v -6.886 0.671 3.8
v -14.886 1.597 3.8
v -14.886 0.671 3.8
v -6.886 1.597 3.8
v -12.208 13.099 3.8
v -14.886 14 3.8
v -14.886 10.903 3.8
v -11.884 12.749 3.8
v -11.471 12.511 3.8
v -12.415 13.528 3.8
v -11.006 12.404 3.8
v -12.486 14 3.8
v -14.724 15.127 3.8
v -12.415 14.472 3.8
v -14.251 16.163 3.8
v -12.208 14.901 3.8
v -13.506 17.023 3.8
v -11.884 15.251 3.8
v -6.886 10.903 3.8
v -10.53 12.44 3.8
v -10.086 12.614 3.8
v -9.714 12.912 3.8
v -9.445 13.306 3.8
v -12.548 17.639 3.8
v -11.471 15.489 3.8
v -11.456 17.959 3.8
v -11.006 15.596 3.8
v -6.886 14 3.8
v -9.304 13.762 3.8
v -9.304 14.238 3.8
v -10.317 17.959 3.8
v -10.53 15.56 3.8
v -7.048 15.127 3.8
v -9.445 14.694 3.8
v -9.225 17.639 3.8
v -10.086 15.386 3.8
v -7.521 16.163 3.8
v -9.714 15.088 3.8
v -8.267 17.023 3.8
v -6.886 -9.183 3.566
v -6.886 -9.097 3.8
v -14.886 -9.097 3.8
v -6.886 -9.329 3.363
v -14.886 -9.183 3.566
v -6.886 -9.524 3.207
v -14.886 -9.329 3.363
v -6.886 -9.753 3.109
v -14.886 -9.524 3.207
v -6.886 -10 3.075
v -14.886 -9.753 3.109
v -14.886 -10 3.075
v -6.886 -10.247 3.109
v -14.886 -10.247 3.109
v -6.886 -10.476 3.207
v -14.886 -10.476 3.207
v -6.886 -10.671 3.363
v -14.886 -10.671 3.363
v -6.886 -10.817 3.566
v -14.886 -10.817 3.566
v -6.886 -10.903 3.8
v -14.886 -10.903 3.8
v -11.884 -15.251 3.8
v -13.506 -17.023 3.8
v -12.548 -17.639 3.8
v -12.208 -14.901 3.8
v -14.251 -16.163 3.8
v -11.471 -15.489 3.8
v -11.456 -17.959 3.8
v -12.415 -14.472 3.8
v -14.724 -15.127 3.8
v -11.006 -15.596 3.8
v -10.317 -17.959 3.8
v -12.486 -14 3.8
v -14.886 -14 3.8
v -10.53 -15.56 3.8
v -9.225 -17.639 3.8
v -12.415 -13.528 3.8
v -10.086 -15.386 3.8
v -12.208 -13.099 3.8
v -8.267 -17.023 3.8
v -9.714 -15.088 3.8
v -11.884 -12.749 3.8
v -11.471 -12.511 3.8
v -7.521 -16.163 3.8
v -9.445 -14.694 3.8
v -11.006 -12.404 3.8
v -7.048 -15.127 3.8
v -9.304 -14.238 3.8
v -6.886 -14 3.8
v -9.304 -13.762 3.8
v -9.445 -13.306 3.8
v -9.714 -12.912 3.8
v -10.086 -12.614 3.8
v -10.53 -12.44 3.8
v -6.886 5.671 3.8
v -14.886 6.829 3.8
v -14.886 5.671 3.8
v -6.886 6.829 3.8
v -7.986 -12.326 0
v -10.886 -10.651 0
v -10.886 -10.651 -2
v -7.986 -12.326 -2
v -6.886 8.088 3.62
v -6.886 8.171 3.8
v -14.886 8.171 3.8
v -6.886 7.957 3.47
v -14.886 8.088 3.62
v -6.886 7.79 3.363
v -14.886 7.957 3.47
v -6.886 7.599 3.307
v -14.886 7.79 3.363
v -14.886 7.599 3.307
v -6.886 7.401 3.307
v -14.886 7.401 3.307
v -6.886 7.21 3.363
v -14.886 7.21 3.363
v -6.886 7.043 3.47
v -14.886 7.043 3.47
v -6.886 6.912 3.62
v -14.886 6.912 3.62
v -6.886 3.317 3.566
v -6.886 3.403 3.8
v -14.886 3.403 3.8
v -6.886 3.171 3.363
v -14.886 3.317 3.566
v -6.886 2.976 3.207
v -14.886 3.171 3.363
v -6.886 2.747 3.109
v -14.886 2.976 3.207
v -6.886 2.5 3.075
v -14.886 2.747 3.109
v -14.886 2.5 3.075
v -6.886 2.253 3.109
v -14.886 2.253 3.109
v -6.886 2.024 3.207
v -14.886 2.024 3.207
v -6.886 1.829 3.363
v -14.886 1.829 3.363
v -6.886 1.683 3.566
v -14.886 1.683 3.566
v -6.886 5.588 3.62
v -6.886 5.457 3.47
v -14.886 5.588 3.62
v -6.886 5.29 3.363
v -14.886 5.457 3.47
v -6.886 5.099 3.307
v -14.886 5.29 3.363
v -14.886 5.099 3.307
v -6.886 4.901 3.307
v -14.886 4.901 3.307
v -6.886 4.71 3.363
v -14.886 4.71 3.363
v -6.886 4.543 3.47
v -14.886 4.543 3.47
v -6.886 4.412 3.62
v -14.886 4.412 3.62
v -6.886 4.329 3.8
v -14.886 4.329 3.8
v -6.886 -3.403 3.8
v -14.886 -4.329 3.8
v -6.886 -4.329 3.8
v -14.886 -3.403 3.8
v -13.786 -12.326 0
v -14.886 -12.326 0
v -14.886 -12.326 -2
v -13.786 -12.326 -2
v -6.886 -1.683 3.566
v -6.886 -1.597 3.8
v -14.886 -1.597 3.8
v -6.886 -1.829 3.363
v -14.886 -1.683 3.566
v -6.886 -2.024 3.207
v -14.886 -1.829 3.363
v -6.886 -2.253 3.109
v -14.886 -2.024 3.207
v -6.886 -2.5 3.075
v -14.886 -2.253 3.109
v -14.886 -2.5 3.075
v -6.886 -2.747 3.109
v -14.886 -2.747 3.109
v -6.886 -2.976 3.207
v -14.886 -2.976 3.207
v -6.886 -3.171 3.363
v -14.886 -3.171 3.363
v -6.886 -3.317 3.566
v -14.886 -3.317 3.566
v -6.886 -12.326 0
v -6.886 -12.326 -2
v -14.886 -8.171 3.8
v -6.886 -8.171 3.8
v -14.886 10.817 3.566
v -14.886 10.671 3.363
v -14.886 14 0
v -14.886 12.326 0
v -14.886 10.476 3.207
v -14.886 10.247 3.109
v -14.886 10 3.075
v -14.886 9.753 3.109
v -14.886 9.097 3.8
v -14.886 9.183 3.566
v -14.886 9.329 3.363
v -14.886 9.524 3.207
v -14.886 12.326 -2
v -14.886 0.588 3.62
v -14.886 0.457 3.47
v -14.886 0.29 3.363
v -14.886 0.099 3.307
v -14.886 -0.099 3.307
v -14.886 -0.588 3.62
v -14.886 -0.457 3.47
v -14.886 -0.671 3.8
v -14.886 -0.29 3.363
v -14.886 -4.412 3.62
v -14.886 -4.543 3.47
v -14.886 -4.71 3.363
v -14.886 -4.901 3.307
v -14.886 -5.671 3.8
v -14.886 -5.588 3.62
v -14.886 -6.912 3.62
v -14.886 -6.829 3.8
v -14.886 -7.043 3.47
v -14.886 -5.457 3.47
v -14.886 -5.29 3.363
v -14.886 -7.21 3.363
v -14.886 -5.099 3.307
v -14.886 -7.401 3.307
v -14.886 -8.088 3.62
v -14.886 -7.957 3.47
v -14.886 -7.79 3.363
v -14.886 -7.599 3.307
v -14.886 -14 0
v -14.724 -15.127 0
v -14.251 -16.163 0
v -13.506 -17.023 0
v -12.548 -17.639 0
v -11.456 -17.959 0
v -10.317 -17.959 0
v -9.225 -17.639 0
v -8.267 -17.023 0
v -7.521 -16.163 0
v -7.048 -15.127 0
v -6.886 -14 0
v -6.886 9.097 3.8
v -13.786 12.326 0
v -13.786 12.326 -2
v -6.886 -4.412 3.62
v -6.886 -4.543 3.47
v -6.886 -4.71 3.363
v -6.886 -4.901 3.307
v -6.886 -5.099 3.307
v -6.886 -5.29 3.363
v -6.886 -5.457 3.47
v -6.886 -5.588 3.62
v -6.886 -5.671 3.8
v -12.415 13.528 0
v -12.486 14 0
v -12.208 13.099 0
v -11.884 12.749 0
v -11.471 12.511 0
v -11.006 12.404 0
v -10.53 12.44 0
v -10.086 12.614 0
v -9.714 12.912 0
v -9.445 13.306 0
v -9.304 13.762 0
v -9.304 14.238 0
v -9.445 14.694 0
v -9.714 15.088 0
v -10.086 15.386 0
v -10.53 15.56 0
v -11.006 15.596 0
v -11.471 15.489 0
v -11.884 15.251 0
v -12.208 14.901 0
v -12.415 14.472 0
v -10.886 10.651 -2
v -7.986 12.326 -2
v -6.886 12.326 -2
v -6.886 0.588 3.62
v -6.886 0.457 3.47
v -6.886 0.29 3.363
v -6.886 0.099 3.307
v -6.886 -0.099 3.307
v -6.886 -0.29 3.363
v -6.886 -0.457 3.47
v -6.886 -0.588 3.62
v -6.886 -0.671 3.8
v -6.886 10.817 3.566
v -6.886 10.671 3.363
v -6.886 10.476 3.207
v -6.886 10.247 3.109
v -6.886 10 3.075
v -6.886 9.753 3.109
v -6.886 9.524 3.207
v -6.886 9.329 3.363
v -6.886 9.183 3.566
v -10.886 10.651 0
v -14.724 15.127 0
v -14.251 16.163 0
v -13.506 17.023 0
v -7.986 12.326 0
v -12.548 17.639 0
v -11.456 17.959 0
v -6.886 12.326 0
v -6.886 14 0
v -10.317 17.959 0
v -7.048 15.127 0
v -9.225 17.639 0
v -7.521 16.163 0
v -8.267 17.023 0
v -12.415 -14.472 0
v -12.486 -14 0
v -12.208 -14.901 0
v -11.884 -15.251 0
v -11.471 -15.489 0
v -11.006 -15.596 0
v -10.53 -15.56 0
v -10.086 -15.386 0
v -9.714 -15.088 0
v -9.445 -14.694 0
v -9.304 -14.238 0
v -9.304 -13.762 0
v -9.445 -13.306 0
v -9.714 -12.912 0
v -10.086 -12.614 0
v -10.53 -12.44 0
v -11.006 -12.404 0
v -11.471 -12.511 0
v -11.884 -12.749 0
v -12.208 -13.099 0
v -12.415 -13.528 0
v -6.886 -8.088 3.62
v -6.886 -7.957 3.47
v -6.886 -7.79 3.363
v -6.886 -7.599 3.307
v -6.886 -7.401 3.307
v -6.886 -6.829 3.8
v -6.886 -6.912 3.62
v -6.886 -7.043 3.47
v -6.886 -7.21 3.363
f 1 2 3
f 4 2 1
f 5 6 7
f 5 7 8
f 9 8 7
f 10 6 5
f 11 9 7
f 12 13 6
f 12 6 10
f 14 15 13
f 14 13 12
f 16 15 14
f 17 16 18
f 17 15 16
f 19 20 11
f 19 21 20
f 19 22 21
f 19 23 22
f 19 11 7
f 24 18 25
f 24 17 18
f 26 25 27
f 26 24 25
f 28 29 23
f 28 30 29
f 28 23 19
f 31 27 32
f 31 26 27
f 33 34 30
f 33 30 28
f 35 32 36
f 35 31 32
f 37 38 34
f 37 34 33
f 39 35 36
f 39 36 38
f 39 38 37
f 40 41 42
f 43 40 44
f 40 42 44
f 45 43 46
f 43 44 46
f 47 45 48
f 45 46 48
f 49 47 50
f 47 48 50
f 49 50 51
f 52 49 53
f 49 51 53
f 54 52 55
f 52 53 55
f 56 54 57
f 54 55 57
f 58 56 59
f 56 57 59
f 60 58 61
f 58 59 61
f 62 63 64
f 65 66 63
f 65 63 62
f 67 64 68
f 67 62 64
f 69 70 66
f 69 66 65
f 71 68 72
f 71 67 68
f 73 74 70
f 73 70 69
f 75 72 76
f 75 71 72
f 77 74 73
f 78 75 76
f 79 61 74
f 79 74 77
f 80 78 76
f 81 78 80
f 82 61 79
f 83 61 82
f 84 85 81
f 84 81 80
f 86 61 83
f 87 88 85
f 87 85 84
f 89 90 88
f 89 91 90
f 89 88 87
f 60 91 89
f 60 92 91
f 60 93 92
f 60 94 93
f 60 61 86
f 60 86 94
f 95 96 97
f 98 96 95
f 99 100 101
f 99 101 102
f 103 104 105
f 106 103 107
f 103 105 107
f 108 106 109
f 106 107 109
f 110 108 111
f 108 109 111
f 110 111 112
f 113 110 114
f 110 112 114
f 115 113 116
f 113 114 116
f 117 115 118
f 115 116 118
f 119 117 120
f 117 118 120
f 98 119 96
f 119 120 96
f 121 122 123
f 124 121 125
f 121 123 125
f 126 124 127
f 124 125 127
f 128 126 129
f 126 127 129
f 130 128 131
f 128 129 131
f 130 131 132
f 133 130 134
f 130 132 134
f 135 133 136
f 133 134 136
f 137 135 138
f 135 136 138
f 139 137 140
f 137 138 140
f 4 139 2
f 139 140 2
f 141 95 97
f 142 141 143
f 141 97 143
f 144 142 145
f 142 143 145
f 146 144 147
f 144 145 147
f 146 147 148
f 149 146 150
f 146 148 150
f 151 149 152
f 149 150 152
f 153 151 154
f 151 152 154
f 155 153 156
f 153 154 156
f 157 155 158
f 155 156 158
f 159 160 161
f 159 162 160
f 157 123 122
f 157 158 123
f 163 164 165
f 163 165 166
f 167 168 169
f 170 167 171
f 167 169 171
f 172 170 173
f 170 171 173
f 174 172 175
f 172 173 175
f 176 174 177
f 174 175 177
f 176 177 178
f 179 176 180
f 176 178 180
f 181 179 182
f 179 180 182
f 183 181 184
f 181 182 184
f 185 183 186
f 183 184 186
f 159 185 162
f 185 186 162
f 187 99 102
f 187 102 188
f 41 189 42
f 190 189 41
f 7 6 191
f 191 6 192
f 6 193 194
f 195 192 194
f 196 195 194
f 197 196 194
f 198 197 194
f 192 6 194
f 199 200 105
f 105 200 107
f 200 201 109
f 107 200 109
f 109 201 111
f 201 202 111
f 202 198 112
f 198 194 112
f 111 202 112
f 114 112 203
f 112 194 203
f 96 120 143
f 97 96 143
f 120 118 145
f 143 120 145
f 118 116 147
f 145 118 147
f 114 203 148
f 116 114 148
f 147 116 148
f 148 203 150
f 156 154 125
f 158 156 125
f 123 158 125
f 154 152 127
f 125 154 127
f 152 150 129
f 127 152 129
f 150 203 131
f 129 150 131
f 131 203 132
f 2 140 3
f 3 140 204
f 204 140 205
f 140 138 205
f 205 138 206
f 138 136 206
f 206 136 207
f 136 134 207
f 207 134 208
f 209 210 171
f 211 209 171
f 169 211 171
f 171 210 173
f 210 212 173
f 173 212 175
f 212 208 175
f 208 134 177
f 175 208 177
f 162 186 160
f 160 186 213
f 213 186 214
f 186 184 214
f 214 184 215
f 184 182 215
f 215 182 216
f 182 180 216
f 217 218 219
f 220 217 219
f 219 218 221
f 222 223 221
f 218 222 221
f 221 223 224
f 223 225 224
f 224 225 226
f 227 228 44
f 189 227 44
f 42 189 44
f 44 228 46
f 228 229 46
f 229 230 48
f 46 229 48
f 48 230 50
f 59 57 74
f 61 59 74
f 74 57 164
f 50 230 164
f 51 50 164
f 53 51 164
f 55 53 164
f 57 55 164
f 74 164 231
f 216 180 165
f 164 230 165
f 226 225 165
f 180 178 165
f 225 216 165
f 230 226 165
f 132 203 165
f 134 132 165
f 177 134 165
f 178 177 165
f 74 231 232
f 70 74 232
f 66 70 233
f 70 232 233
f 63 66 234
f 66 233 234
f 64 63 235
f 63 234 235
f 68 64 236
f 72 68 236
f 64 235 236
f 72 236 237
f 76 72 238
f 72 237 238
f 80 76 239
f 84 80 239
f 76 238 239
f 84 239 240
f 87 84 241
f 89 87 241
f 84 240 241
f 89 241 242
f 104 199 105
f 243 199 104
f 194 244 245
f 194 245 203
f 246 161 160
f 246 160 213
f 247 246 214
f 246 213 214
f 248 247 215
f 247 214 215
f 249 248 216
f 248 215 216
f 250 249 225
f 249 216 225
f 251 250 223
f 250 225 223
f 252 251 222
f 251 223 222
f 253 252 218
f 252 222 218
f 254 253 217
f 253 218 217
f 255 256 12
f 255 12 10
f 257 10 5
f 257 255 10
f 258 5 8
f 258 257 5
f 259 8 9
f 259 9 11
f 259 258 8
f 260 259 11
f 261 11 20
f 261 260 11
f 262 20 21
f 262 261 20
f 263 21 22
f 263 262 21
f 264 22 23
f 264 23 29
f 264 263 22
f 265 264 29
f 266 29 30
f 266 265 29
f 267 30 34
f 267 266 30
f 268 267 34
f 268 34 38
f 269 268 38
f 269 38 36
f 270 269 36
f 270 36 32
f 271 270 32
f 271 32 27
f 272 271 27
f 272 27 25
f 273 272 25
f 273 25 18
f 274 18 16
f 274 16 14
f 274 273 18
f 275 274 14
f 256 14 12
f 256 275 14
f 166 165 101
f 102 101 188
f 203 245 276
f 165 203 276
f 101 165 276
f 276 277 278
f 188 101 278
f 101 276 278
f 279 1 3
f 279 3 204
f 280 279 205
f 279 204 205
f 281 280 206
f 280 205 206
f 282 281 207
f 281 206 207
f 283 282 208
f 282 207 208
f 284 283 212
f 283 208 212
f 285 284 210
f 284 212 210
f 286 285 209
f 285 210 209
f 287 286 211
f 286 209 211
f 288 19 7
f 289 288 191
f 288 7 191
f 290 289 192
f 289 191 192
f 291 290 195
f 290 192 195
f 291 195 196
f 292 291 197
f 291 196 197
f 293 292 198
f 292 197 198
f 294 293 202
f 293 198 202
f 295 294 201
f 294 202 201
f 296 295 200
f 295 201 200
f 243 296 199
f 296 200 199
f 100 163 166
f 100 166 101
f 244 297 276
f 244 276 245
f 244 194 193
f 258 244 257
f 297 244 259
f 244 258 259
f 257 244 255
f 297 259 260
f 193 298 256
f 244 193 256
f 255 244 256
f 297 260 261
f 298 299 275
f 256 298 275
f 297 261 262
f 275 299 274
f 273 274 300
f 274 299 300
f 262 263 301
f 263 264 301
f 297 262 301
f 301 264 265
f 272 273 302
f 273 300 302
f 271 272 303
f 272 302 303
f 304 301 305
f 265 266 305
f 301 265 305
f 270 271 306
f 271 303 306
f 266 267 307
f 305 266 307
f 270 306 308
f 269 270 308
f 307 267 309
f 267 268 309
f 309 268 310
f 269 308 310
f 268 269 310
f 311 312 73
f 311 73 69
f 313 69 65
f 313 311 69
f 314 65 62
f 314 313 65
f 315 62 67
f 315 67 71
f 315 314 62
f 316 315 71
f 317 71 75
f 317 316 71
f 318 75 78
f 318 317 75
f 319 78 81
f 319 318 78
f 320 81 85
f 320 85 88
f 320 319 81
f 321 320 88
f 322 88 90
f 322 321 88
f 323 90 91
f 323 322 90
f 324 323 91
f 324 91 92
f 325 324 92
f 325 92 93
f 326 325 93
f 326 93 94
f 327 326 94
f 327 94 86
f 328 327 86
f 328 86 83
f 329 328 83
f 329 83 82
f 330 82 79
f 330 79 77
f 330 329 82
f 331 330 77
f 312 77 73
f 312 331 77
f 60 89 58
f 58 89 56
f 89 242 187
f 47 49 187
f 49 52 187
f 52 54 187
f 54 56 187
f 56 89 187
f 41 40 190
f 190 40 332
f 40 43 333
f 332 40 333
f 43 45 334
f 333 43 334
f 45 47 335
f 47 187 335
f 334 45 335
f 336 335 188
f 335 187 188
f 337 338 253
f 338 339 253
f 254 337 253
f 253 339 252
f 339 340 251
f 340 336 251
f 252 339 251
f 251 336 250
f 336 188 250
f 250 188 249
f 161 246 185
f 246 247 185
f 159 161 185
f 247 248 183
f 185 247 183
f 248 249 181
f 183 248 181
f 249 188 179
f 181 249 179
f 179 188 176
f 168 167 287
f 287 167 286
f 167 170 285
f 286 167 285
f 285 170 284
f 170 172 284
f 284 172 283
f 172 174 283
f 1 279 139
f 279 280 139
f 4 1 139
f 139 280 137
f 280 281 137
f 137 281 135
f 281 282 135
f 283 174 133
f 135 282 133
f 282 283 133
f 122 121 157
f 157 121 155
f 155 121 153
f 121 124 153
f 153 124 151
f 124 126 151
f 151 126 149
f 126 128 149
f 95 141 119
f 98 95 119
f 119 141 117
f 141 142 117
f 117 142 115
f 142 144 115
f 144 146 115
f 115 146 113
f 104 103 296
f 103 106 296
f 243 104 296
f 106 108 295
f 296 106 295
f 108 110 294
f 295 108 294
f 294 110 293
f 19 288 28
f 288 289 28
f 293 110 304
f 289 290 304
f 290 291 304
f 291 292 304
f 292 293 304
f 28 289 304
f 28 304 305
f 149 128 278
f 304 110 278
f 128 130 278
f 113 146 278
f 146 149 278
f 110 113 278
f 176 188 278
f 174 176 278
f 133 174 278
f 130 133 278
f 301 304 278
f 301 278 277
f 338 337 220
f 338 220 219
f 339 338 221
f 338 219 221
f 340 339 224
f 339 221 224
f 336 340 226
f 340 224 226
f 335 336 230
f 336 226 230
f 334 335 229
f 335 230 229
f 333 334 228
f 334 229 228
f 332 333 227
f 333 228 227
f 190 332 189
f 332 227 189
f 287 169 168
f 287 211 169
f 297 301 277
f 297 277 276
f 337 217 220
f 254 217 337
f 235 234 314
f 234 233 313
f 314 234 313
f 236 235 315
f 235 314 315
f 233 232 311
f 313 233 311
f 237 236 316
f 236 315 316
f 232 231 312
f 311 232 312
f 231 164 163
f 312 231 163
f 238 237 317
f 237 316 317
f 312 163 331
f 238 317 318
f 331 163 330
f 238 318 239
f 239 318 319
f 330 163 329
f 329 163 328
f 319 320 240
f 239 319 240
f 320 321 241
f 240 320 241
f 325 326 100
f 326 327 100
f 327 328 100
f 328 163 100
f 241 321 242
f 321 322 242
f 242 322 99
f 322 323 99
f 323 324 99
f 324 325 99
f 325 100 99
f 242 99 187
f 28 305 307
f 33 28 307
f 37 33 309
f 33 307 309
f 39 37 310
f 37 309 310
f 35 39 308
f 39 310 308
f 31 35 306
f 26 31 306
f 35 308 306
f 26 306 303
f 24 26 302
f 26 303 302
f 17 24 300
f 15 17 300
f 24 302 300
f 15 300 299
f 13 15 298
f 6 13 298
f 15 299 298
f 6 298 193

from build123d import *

# Parameters (mm, degrees)
SKETCH_2_R          = 1.6
EXTRUDE_1_DEPTH     = 3.8
CUT_EXTRUDE_1_REACH = 22.061
SKETCH_3_R          = 0.925
SKETCH_3_R_2        = 0.7
EXTRUDE_2_DEPTH     = 2


with BuildPart() as part:
    # Эскиз2 → Бобышка-Вытянуть1 (new body)
    with BuildSketch(Plane.XY):
        with BuildLine():
            Line((-14.886464029, 14), (-14.886464029, -14))
            ThreePointArc((-14.886464029, -14), (-10.886464029, -18), (-6.886464029, -14))
            Line((-6.886464029, -14), (-6.886464029, 14))
            ThreePointArc((-6.886464029, 14), (-10.886464029, 18), (-14.886464029, 14))
        make_face()
        with Locations(Location((-10.886464029, -14, 0), (0, 0, 180))):
            Circle(SKETCH_2_R, mode=Mode.SUBTRACT)
        with Locations(Location((-10.886464029, 14, 0), (0, 0, 180))):
            Circle(SKETCH_2_R, mode=Mode.SUBTRACT)
    extrude(amount=EXTRUDE_1_DEPTH)

    # Эскиз3 → Вырез-Вытянуть1 (cut, up to next)
    with BuildSketch(Plane.ZY.offset(14.886464029), mode=Mode.PRIVATE) as cut_extrude_1_sk1:
        with Locations((4, -10)):
            Circle(SKETCH_3_R)
    cut_extrude_1_tool1 = extrude(cut_extrude_1_sk1.sketch, amount=-CUT_EXTRUDE_1_REACH, mode=Mode.PRIVATE) & part.part
    # Эскиз3 → Вырез-Вытянуть1 (cut, up to next)
    with BuildSketch(Plane.ZY.offset(14.886464029), mode=Mode.PRIVATE) as cut_extrude_1_sk2:
        with Locations((4, -7.5)):
            Circle(SKETCH_3_R_2)
    cut_extrude_1_tool2 = extrude(cut_extrude_1_sk2.sketch, amount=-CUT_EXTRUDE_1_REACH, mode=Mode.PRIVATE) & part.part
    # Эскиз3 → Вырез-Вытянуть1 (cut, up to next)
    with BuildSketch(Plane.ZY.offset(14.886464029), mode=Mode.PRIVATE) as cut_extrude_1_sk3:
        with Locations((4, -5)):
            Circle(SKETCH_3_R_2)
    cut_extrude_1_tool3 = extrude(cut_extrude_1_sk3.sketch, amount=-CUT_EXTRUDE_1_REACH, mode=Mode.PRIVATE) & part.part
    # Эскиз3 → Вырез-Вытянуть1 (cut, up to next)
    with BuildSketch(Plane.ZY.offset(14.886464029), mode=Mode.PRIVATE) as cut_extrude_1_sk4:
        with Locations((4, 10)):
            Circle(SKETCH_3_R)
    cut_extrude_1_tool4 = extrude(cut_extrude_1_sk4.sketch, amount=-CUT_EXTRUDE_1_REACH, mode=Mode.PRIVATE) & part.part
    # Эскиз3 → Вырез-Вытянуть1 (cut, up to next)
    with BuildSketch(Plane.ZY.offset(14.886464029), mode=Mode.PRIVATE) as cut_extrude_1_sk5:
        with Locations((4, 7.5)):
            Circle(SKETCH_3_R_2)
    cut_extrude_1_tool5 = extrude(cut_extrude_1_sk5.sketch, amount=-CUT_EXTRUDE_1_REACH, mode=Mode.PRIVATE) & part.part
    # Эскиз3 → Вырез-Вытянуть1 (cut, up to next)
    with BuildSketch(Plane.ZY.offset(14.886464029), mode=Mode.PRIVATE) as cut_extrude_1_sk6:
        with Locations((4, 5)):
            Circle(SKETCH_3_R_2)
    cut_extrude_1_tool6 = extrude(cut_extrude_1_sk6.sketch, amount=-CUT_EXTRUDE_1_REACH, mode=Mode.PRIVATE) & part.part
    # Эскиз3 → Вырез-Вытянуть1 (cut, up to next)
    with BuildSketch(Plane.ZY.offset(14.886464029), mode=Mode.PRIVATE) as cut_extrude_1_sk7:
        with Locations((4, 2.5)):
            Circle(SKETCH_3_R)
    cut_extrude_1_tool7 = extrude(cut_extrude_1_sk7.sketch, amount=-CUT_EXTRUDE_1_REACH, mode=Mode.PRIVATE) & part.part
    # Эскиз3 → Вырез-Вытянуть1 (cut, up to next)
    with BuildSketch(Plane.ZY.offset(14.886464029), mode=Mode.PRIVATE) as cut_extrude_1_sk8:
        with Locations((4, 0)):
            Circle(SKETCH_3_R_2)
    cut_extrude_1_tool8 = extrude(cut_extrude_1_sk8.sketch, amount=-CUT_EXTRUDE_1_REACH, mode=Mode.PRIVATE) & part.part
    # Эскиз3 → Вырез-Вытянуть1 (cut, up to next)
    with BuildSketch(Plane.ZY.offset(14.886464029), mode=Mode.PRIVATE) as cut_extrude_1_sk9:
        with Locations((4, -2.5)):
            Circle(SKETCH_3_R)
    cut_extrude_1_tool9 = extrude(cut_extrude_1_sk9.sketch, amount=-CUT_EXTRUDE_1_REACH, mode=Mode.PRIVATE) & part.part
    add(cut_extrude_1_tool1.solids().sort_by_distance((-14.886464, -10, 4))[0], mode=Mode.SUBTRACT)
    add(cut_extrude_1_tool2.solids().sort_by_distance((-14.886464, -7.5, 4))[0], mode=Mode.SUBTRACT)
    add(cut_extrude_1_tool3.solids().sort_by_distance((-14.886464, -5, 4))[0], mode=Mode.SUBTRACT)
    add(cut_extrude_1_tool4.solids().sort_by_distance((-14.886464, 10, 4))[0], mode=Mode.SUBTRACT)
    add(cut_extrude_1_tool5.solids().sort_by_distance((-14.886464, 7.5, 4))[0], mode=Mode.SUBTRACT)
    add(cut_extrude_1_tool6.solids().sort_by_distance((-14.886464, 5, 4))[0], mode=Mode.SUBTRACT)
    add(cut_extrude_1_tool7.solids().sort_by_distance((-14.886464, 2.5, 4))[0], mode=Mode.SUBTRACT)
    add(cut_extrude_1_tool8.solids().sort_by_distance((-14.886464, 0, 4))[0], mode=Mode.SUBTRACT)
    add(cut_extrude_1_tool9.solids().sort_by_distance((-14.886464, -2.5, 4))[0], mode=Mode.SUBTRACT)

    # Эскиз4 → Бобышка-Вытянуть2 (add)
    with BuildSketch(Plane(origin=(0, 0, 0), x_dir=(-1, 0, 0), z_dir=(0, 0, -1))):
        Polygon((10.886464029, 10.651368439), (13.786464029, 12.325684219), (14.886464029, 12.325684219), (14.886464029, -12.325684219), (13.786464029, -12.325684219), (10.886464029, -10.651368439), (7.986464029, -12.325684219), (6.886464029, -12.325684219), (6.886464029, 12.325684219), (7.986464029, 12.325684219), align=None)
    extrude(amount=EXTRUDE_2_DEPTH)


solid = part.part
